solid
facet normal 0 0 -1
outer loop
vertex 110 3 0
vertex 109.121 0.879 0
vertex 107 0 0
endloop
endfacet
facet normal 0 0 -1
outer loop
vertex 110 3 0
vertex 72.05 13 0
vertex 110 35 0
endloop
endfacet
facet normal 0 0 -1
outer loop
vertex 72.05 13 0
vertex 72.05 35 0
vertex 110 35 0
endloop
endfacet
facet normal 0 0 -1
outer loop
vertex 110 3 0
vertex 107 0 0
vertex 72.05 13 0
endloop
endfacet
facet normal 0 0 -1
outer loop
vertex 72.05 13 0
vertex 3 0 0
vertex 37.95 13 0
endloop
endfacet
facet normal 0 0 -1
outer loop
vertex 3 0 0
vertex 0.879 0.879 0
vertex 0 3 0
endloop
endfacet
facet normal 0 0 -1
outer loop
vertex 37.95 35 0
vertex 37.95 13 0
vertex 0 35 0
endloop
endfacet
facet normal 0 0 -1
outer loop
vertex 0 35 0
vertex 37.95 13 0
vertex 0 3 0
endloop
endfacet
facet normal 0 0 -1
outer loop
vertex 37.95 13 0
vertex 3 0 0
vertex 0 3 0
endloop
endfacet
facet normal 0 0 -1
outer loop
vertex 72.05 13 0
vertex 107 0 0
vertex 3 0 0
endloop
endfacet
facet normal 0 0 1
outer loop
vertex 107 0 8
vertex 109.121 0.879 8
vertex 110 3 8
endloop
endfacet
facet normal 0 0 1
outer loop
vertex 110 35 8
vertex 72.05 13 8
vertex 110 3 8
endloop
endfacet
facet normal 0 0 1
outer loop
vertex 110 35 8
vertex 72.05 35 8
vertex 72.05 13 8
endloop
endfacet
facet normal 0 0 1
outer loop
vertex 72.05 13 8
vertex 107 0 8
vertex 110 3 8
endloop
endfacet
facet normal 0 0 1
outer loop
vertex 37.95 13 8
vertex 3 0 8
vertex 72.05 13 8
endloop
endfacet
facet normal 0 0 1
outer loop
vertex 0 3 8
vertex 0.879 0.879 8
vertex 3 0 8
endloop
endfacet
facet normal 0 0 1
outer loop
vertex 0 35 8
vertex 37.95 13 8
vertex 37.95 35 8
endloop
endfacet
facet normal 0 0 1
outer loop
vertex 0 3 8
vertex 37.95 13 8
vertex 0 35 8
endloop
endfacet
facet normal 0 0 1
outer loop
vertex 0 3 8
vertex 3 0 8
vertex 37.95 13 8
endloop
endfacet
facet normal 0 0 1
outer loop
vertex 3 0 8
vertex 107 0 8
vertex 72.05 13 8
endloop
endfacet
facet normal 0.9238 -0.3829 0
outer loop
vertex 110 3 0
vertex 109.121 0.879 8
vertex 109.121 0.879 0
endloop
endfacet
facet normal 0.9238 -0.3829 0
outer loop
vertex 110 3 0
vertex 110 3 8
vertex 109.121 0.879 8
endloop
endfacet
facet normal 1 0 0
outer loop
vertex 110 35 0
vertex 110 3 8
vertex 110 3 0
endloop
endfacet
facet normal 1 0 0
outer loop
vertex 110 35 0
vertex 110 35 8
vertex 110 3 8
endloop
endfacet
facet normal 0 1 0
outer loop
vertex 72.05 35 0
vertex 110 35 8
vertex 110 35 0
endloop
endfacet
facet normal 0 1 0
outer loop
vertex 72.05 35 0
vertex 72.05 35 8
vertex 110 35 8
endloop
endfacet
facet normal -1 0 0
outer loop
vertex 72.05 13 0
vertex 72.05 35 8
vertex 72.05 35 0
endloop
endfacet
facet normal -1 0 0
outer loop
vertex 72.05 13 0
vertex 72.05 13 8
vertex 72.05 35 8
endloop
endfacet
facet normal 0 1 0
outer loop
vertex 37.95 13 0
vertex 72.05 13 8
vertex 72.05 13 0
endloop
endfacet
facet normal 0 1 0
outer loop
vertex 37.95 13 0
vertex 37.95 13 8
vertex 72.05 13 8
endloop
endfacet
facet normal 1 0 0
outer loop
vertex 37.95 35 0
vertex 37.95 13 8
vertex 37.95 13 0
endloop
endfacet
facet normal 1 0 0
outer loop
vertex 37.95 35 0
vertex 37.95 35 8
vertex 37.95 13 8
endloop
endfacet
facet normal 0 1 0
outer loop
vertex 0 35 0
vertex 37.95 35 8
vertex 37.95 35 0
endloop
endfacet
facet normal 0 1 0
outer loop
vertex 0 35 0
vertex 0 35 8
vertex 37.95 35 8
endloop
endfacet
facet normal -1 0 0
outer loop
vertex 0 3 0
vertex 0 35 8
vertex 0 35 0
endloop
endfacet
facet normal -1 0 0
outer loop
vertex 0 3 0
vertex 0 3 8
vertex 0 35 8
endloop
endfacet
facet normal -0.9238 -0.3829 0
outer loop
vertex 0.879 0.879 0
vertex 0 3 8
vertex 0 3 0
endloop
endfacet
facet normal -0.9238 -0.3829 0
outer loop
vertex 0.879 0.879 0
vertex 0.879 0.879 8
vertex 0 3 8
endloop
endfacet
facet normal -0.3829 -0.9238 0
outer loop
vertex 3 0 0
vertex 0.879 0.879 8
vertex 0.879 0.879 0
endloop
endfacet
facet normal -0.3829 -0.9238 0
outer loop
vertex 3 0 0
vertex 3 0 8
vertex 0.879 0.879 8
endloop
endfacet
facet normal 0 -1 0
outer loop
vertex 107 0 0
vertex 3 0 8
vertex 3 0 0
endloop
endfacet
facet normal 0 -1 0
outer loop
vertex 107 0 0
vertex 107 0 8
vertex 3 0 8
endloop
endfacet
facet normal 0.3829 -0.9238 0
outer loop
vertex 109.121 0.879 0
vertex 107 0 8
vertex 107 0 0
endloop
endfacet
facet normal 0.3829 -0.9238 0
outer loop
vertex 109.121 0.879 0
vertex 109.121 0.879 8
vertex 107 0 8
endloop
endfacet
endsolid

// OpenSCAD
$fn = 32;

// ----------------------------------------------------------------------
// Window plate: 110 x 35 mm, 1 open windows
// ----------------------------------------------------------------------

// --- parameters (mm) ---
profile_height = 8;       // extrusion height
profile_points = 12;      // points of the closed outline

profile = [[0, 3], [0.879, 0.879], [3, 0], [107, 0], [109.121, 0.879], [110, 3], [110, 35], [72.05, 35], [72.05, 13], [37.95, 13], [37.95, 35], [0, 35]];  // single closed polygon, 12 points, counter clockwise

// --- the one profile operation ---
linear_extrude(height = profile_height) polygon(points = profile);
